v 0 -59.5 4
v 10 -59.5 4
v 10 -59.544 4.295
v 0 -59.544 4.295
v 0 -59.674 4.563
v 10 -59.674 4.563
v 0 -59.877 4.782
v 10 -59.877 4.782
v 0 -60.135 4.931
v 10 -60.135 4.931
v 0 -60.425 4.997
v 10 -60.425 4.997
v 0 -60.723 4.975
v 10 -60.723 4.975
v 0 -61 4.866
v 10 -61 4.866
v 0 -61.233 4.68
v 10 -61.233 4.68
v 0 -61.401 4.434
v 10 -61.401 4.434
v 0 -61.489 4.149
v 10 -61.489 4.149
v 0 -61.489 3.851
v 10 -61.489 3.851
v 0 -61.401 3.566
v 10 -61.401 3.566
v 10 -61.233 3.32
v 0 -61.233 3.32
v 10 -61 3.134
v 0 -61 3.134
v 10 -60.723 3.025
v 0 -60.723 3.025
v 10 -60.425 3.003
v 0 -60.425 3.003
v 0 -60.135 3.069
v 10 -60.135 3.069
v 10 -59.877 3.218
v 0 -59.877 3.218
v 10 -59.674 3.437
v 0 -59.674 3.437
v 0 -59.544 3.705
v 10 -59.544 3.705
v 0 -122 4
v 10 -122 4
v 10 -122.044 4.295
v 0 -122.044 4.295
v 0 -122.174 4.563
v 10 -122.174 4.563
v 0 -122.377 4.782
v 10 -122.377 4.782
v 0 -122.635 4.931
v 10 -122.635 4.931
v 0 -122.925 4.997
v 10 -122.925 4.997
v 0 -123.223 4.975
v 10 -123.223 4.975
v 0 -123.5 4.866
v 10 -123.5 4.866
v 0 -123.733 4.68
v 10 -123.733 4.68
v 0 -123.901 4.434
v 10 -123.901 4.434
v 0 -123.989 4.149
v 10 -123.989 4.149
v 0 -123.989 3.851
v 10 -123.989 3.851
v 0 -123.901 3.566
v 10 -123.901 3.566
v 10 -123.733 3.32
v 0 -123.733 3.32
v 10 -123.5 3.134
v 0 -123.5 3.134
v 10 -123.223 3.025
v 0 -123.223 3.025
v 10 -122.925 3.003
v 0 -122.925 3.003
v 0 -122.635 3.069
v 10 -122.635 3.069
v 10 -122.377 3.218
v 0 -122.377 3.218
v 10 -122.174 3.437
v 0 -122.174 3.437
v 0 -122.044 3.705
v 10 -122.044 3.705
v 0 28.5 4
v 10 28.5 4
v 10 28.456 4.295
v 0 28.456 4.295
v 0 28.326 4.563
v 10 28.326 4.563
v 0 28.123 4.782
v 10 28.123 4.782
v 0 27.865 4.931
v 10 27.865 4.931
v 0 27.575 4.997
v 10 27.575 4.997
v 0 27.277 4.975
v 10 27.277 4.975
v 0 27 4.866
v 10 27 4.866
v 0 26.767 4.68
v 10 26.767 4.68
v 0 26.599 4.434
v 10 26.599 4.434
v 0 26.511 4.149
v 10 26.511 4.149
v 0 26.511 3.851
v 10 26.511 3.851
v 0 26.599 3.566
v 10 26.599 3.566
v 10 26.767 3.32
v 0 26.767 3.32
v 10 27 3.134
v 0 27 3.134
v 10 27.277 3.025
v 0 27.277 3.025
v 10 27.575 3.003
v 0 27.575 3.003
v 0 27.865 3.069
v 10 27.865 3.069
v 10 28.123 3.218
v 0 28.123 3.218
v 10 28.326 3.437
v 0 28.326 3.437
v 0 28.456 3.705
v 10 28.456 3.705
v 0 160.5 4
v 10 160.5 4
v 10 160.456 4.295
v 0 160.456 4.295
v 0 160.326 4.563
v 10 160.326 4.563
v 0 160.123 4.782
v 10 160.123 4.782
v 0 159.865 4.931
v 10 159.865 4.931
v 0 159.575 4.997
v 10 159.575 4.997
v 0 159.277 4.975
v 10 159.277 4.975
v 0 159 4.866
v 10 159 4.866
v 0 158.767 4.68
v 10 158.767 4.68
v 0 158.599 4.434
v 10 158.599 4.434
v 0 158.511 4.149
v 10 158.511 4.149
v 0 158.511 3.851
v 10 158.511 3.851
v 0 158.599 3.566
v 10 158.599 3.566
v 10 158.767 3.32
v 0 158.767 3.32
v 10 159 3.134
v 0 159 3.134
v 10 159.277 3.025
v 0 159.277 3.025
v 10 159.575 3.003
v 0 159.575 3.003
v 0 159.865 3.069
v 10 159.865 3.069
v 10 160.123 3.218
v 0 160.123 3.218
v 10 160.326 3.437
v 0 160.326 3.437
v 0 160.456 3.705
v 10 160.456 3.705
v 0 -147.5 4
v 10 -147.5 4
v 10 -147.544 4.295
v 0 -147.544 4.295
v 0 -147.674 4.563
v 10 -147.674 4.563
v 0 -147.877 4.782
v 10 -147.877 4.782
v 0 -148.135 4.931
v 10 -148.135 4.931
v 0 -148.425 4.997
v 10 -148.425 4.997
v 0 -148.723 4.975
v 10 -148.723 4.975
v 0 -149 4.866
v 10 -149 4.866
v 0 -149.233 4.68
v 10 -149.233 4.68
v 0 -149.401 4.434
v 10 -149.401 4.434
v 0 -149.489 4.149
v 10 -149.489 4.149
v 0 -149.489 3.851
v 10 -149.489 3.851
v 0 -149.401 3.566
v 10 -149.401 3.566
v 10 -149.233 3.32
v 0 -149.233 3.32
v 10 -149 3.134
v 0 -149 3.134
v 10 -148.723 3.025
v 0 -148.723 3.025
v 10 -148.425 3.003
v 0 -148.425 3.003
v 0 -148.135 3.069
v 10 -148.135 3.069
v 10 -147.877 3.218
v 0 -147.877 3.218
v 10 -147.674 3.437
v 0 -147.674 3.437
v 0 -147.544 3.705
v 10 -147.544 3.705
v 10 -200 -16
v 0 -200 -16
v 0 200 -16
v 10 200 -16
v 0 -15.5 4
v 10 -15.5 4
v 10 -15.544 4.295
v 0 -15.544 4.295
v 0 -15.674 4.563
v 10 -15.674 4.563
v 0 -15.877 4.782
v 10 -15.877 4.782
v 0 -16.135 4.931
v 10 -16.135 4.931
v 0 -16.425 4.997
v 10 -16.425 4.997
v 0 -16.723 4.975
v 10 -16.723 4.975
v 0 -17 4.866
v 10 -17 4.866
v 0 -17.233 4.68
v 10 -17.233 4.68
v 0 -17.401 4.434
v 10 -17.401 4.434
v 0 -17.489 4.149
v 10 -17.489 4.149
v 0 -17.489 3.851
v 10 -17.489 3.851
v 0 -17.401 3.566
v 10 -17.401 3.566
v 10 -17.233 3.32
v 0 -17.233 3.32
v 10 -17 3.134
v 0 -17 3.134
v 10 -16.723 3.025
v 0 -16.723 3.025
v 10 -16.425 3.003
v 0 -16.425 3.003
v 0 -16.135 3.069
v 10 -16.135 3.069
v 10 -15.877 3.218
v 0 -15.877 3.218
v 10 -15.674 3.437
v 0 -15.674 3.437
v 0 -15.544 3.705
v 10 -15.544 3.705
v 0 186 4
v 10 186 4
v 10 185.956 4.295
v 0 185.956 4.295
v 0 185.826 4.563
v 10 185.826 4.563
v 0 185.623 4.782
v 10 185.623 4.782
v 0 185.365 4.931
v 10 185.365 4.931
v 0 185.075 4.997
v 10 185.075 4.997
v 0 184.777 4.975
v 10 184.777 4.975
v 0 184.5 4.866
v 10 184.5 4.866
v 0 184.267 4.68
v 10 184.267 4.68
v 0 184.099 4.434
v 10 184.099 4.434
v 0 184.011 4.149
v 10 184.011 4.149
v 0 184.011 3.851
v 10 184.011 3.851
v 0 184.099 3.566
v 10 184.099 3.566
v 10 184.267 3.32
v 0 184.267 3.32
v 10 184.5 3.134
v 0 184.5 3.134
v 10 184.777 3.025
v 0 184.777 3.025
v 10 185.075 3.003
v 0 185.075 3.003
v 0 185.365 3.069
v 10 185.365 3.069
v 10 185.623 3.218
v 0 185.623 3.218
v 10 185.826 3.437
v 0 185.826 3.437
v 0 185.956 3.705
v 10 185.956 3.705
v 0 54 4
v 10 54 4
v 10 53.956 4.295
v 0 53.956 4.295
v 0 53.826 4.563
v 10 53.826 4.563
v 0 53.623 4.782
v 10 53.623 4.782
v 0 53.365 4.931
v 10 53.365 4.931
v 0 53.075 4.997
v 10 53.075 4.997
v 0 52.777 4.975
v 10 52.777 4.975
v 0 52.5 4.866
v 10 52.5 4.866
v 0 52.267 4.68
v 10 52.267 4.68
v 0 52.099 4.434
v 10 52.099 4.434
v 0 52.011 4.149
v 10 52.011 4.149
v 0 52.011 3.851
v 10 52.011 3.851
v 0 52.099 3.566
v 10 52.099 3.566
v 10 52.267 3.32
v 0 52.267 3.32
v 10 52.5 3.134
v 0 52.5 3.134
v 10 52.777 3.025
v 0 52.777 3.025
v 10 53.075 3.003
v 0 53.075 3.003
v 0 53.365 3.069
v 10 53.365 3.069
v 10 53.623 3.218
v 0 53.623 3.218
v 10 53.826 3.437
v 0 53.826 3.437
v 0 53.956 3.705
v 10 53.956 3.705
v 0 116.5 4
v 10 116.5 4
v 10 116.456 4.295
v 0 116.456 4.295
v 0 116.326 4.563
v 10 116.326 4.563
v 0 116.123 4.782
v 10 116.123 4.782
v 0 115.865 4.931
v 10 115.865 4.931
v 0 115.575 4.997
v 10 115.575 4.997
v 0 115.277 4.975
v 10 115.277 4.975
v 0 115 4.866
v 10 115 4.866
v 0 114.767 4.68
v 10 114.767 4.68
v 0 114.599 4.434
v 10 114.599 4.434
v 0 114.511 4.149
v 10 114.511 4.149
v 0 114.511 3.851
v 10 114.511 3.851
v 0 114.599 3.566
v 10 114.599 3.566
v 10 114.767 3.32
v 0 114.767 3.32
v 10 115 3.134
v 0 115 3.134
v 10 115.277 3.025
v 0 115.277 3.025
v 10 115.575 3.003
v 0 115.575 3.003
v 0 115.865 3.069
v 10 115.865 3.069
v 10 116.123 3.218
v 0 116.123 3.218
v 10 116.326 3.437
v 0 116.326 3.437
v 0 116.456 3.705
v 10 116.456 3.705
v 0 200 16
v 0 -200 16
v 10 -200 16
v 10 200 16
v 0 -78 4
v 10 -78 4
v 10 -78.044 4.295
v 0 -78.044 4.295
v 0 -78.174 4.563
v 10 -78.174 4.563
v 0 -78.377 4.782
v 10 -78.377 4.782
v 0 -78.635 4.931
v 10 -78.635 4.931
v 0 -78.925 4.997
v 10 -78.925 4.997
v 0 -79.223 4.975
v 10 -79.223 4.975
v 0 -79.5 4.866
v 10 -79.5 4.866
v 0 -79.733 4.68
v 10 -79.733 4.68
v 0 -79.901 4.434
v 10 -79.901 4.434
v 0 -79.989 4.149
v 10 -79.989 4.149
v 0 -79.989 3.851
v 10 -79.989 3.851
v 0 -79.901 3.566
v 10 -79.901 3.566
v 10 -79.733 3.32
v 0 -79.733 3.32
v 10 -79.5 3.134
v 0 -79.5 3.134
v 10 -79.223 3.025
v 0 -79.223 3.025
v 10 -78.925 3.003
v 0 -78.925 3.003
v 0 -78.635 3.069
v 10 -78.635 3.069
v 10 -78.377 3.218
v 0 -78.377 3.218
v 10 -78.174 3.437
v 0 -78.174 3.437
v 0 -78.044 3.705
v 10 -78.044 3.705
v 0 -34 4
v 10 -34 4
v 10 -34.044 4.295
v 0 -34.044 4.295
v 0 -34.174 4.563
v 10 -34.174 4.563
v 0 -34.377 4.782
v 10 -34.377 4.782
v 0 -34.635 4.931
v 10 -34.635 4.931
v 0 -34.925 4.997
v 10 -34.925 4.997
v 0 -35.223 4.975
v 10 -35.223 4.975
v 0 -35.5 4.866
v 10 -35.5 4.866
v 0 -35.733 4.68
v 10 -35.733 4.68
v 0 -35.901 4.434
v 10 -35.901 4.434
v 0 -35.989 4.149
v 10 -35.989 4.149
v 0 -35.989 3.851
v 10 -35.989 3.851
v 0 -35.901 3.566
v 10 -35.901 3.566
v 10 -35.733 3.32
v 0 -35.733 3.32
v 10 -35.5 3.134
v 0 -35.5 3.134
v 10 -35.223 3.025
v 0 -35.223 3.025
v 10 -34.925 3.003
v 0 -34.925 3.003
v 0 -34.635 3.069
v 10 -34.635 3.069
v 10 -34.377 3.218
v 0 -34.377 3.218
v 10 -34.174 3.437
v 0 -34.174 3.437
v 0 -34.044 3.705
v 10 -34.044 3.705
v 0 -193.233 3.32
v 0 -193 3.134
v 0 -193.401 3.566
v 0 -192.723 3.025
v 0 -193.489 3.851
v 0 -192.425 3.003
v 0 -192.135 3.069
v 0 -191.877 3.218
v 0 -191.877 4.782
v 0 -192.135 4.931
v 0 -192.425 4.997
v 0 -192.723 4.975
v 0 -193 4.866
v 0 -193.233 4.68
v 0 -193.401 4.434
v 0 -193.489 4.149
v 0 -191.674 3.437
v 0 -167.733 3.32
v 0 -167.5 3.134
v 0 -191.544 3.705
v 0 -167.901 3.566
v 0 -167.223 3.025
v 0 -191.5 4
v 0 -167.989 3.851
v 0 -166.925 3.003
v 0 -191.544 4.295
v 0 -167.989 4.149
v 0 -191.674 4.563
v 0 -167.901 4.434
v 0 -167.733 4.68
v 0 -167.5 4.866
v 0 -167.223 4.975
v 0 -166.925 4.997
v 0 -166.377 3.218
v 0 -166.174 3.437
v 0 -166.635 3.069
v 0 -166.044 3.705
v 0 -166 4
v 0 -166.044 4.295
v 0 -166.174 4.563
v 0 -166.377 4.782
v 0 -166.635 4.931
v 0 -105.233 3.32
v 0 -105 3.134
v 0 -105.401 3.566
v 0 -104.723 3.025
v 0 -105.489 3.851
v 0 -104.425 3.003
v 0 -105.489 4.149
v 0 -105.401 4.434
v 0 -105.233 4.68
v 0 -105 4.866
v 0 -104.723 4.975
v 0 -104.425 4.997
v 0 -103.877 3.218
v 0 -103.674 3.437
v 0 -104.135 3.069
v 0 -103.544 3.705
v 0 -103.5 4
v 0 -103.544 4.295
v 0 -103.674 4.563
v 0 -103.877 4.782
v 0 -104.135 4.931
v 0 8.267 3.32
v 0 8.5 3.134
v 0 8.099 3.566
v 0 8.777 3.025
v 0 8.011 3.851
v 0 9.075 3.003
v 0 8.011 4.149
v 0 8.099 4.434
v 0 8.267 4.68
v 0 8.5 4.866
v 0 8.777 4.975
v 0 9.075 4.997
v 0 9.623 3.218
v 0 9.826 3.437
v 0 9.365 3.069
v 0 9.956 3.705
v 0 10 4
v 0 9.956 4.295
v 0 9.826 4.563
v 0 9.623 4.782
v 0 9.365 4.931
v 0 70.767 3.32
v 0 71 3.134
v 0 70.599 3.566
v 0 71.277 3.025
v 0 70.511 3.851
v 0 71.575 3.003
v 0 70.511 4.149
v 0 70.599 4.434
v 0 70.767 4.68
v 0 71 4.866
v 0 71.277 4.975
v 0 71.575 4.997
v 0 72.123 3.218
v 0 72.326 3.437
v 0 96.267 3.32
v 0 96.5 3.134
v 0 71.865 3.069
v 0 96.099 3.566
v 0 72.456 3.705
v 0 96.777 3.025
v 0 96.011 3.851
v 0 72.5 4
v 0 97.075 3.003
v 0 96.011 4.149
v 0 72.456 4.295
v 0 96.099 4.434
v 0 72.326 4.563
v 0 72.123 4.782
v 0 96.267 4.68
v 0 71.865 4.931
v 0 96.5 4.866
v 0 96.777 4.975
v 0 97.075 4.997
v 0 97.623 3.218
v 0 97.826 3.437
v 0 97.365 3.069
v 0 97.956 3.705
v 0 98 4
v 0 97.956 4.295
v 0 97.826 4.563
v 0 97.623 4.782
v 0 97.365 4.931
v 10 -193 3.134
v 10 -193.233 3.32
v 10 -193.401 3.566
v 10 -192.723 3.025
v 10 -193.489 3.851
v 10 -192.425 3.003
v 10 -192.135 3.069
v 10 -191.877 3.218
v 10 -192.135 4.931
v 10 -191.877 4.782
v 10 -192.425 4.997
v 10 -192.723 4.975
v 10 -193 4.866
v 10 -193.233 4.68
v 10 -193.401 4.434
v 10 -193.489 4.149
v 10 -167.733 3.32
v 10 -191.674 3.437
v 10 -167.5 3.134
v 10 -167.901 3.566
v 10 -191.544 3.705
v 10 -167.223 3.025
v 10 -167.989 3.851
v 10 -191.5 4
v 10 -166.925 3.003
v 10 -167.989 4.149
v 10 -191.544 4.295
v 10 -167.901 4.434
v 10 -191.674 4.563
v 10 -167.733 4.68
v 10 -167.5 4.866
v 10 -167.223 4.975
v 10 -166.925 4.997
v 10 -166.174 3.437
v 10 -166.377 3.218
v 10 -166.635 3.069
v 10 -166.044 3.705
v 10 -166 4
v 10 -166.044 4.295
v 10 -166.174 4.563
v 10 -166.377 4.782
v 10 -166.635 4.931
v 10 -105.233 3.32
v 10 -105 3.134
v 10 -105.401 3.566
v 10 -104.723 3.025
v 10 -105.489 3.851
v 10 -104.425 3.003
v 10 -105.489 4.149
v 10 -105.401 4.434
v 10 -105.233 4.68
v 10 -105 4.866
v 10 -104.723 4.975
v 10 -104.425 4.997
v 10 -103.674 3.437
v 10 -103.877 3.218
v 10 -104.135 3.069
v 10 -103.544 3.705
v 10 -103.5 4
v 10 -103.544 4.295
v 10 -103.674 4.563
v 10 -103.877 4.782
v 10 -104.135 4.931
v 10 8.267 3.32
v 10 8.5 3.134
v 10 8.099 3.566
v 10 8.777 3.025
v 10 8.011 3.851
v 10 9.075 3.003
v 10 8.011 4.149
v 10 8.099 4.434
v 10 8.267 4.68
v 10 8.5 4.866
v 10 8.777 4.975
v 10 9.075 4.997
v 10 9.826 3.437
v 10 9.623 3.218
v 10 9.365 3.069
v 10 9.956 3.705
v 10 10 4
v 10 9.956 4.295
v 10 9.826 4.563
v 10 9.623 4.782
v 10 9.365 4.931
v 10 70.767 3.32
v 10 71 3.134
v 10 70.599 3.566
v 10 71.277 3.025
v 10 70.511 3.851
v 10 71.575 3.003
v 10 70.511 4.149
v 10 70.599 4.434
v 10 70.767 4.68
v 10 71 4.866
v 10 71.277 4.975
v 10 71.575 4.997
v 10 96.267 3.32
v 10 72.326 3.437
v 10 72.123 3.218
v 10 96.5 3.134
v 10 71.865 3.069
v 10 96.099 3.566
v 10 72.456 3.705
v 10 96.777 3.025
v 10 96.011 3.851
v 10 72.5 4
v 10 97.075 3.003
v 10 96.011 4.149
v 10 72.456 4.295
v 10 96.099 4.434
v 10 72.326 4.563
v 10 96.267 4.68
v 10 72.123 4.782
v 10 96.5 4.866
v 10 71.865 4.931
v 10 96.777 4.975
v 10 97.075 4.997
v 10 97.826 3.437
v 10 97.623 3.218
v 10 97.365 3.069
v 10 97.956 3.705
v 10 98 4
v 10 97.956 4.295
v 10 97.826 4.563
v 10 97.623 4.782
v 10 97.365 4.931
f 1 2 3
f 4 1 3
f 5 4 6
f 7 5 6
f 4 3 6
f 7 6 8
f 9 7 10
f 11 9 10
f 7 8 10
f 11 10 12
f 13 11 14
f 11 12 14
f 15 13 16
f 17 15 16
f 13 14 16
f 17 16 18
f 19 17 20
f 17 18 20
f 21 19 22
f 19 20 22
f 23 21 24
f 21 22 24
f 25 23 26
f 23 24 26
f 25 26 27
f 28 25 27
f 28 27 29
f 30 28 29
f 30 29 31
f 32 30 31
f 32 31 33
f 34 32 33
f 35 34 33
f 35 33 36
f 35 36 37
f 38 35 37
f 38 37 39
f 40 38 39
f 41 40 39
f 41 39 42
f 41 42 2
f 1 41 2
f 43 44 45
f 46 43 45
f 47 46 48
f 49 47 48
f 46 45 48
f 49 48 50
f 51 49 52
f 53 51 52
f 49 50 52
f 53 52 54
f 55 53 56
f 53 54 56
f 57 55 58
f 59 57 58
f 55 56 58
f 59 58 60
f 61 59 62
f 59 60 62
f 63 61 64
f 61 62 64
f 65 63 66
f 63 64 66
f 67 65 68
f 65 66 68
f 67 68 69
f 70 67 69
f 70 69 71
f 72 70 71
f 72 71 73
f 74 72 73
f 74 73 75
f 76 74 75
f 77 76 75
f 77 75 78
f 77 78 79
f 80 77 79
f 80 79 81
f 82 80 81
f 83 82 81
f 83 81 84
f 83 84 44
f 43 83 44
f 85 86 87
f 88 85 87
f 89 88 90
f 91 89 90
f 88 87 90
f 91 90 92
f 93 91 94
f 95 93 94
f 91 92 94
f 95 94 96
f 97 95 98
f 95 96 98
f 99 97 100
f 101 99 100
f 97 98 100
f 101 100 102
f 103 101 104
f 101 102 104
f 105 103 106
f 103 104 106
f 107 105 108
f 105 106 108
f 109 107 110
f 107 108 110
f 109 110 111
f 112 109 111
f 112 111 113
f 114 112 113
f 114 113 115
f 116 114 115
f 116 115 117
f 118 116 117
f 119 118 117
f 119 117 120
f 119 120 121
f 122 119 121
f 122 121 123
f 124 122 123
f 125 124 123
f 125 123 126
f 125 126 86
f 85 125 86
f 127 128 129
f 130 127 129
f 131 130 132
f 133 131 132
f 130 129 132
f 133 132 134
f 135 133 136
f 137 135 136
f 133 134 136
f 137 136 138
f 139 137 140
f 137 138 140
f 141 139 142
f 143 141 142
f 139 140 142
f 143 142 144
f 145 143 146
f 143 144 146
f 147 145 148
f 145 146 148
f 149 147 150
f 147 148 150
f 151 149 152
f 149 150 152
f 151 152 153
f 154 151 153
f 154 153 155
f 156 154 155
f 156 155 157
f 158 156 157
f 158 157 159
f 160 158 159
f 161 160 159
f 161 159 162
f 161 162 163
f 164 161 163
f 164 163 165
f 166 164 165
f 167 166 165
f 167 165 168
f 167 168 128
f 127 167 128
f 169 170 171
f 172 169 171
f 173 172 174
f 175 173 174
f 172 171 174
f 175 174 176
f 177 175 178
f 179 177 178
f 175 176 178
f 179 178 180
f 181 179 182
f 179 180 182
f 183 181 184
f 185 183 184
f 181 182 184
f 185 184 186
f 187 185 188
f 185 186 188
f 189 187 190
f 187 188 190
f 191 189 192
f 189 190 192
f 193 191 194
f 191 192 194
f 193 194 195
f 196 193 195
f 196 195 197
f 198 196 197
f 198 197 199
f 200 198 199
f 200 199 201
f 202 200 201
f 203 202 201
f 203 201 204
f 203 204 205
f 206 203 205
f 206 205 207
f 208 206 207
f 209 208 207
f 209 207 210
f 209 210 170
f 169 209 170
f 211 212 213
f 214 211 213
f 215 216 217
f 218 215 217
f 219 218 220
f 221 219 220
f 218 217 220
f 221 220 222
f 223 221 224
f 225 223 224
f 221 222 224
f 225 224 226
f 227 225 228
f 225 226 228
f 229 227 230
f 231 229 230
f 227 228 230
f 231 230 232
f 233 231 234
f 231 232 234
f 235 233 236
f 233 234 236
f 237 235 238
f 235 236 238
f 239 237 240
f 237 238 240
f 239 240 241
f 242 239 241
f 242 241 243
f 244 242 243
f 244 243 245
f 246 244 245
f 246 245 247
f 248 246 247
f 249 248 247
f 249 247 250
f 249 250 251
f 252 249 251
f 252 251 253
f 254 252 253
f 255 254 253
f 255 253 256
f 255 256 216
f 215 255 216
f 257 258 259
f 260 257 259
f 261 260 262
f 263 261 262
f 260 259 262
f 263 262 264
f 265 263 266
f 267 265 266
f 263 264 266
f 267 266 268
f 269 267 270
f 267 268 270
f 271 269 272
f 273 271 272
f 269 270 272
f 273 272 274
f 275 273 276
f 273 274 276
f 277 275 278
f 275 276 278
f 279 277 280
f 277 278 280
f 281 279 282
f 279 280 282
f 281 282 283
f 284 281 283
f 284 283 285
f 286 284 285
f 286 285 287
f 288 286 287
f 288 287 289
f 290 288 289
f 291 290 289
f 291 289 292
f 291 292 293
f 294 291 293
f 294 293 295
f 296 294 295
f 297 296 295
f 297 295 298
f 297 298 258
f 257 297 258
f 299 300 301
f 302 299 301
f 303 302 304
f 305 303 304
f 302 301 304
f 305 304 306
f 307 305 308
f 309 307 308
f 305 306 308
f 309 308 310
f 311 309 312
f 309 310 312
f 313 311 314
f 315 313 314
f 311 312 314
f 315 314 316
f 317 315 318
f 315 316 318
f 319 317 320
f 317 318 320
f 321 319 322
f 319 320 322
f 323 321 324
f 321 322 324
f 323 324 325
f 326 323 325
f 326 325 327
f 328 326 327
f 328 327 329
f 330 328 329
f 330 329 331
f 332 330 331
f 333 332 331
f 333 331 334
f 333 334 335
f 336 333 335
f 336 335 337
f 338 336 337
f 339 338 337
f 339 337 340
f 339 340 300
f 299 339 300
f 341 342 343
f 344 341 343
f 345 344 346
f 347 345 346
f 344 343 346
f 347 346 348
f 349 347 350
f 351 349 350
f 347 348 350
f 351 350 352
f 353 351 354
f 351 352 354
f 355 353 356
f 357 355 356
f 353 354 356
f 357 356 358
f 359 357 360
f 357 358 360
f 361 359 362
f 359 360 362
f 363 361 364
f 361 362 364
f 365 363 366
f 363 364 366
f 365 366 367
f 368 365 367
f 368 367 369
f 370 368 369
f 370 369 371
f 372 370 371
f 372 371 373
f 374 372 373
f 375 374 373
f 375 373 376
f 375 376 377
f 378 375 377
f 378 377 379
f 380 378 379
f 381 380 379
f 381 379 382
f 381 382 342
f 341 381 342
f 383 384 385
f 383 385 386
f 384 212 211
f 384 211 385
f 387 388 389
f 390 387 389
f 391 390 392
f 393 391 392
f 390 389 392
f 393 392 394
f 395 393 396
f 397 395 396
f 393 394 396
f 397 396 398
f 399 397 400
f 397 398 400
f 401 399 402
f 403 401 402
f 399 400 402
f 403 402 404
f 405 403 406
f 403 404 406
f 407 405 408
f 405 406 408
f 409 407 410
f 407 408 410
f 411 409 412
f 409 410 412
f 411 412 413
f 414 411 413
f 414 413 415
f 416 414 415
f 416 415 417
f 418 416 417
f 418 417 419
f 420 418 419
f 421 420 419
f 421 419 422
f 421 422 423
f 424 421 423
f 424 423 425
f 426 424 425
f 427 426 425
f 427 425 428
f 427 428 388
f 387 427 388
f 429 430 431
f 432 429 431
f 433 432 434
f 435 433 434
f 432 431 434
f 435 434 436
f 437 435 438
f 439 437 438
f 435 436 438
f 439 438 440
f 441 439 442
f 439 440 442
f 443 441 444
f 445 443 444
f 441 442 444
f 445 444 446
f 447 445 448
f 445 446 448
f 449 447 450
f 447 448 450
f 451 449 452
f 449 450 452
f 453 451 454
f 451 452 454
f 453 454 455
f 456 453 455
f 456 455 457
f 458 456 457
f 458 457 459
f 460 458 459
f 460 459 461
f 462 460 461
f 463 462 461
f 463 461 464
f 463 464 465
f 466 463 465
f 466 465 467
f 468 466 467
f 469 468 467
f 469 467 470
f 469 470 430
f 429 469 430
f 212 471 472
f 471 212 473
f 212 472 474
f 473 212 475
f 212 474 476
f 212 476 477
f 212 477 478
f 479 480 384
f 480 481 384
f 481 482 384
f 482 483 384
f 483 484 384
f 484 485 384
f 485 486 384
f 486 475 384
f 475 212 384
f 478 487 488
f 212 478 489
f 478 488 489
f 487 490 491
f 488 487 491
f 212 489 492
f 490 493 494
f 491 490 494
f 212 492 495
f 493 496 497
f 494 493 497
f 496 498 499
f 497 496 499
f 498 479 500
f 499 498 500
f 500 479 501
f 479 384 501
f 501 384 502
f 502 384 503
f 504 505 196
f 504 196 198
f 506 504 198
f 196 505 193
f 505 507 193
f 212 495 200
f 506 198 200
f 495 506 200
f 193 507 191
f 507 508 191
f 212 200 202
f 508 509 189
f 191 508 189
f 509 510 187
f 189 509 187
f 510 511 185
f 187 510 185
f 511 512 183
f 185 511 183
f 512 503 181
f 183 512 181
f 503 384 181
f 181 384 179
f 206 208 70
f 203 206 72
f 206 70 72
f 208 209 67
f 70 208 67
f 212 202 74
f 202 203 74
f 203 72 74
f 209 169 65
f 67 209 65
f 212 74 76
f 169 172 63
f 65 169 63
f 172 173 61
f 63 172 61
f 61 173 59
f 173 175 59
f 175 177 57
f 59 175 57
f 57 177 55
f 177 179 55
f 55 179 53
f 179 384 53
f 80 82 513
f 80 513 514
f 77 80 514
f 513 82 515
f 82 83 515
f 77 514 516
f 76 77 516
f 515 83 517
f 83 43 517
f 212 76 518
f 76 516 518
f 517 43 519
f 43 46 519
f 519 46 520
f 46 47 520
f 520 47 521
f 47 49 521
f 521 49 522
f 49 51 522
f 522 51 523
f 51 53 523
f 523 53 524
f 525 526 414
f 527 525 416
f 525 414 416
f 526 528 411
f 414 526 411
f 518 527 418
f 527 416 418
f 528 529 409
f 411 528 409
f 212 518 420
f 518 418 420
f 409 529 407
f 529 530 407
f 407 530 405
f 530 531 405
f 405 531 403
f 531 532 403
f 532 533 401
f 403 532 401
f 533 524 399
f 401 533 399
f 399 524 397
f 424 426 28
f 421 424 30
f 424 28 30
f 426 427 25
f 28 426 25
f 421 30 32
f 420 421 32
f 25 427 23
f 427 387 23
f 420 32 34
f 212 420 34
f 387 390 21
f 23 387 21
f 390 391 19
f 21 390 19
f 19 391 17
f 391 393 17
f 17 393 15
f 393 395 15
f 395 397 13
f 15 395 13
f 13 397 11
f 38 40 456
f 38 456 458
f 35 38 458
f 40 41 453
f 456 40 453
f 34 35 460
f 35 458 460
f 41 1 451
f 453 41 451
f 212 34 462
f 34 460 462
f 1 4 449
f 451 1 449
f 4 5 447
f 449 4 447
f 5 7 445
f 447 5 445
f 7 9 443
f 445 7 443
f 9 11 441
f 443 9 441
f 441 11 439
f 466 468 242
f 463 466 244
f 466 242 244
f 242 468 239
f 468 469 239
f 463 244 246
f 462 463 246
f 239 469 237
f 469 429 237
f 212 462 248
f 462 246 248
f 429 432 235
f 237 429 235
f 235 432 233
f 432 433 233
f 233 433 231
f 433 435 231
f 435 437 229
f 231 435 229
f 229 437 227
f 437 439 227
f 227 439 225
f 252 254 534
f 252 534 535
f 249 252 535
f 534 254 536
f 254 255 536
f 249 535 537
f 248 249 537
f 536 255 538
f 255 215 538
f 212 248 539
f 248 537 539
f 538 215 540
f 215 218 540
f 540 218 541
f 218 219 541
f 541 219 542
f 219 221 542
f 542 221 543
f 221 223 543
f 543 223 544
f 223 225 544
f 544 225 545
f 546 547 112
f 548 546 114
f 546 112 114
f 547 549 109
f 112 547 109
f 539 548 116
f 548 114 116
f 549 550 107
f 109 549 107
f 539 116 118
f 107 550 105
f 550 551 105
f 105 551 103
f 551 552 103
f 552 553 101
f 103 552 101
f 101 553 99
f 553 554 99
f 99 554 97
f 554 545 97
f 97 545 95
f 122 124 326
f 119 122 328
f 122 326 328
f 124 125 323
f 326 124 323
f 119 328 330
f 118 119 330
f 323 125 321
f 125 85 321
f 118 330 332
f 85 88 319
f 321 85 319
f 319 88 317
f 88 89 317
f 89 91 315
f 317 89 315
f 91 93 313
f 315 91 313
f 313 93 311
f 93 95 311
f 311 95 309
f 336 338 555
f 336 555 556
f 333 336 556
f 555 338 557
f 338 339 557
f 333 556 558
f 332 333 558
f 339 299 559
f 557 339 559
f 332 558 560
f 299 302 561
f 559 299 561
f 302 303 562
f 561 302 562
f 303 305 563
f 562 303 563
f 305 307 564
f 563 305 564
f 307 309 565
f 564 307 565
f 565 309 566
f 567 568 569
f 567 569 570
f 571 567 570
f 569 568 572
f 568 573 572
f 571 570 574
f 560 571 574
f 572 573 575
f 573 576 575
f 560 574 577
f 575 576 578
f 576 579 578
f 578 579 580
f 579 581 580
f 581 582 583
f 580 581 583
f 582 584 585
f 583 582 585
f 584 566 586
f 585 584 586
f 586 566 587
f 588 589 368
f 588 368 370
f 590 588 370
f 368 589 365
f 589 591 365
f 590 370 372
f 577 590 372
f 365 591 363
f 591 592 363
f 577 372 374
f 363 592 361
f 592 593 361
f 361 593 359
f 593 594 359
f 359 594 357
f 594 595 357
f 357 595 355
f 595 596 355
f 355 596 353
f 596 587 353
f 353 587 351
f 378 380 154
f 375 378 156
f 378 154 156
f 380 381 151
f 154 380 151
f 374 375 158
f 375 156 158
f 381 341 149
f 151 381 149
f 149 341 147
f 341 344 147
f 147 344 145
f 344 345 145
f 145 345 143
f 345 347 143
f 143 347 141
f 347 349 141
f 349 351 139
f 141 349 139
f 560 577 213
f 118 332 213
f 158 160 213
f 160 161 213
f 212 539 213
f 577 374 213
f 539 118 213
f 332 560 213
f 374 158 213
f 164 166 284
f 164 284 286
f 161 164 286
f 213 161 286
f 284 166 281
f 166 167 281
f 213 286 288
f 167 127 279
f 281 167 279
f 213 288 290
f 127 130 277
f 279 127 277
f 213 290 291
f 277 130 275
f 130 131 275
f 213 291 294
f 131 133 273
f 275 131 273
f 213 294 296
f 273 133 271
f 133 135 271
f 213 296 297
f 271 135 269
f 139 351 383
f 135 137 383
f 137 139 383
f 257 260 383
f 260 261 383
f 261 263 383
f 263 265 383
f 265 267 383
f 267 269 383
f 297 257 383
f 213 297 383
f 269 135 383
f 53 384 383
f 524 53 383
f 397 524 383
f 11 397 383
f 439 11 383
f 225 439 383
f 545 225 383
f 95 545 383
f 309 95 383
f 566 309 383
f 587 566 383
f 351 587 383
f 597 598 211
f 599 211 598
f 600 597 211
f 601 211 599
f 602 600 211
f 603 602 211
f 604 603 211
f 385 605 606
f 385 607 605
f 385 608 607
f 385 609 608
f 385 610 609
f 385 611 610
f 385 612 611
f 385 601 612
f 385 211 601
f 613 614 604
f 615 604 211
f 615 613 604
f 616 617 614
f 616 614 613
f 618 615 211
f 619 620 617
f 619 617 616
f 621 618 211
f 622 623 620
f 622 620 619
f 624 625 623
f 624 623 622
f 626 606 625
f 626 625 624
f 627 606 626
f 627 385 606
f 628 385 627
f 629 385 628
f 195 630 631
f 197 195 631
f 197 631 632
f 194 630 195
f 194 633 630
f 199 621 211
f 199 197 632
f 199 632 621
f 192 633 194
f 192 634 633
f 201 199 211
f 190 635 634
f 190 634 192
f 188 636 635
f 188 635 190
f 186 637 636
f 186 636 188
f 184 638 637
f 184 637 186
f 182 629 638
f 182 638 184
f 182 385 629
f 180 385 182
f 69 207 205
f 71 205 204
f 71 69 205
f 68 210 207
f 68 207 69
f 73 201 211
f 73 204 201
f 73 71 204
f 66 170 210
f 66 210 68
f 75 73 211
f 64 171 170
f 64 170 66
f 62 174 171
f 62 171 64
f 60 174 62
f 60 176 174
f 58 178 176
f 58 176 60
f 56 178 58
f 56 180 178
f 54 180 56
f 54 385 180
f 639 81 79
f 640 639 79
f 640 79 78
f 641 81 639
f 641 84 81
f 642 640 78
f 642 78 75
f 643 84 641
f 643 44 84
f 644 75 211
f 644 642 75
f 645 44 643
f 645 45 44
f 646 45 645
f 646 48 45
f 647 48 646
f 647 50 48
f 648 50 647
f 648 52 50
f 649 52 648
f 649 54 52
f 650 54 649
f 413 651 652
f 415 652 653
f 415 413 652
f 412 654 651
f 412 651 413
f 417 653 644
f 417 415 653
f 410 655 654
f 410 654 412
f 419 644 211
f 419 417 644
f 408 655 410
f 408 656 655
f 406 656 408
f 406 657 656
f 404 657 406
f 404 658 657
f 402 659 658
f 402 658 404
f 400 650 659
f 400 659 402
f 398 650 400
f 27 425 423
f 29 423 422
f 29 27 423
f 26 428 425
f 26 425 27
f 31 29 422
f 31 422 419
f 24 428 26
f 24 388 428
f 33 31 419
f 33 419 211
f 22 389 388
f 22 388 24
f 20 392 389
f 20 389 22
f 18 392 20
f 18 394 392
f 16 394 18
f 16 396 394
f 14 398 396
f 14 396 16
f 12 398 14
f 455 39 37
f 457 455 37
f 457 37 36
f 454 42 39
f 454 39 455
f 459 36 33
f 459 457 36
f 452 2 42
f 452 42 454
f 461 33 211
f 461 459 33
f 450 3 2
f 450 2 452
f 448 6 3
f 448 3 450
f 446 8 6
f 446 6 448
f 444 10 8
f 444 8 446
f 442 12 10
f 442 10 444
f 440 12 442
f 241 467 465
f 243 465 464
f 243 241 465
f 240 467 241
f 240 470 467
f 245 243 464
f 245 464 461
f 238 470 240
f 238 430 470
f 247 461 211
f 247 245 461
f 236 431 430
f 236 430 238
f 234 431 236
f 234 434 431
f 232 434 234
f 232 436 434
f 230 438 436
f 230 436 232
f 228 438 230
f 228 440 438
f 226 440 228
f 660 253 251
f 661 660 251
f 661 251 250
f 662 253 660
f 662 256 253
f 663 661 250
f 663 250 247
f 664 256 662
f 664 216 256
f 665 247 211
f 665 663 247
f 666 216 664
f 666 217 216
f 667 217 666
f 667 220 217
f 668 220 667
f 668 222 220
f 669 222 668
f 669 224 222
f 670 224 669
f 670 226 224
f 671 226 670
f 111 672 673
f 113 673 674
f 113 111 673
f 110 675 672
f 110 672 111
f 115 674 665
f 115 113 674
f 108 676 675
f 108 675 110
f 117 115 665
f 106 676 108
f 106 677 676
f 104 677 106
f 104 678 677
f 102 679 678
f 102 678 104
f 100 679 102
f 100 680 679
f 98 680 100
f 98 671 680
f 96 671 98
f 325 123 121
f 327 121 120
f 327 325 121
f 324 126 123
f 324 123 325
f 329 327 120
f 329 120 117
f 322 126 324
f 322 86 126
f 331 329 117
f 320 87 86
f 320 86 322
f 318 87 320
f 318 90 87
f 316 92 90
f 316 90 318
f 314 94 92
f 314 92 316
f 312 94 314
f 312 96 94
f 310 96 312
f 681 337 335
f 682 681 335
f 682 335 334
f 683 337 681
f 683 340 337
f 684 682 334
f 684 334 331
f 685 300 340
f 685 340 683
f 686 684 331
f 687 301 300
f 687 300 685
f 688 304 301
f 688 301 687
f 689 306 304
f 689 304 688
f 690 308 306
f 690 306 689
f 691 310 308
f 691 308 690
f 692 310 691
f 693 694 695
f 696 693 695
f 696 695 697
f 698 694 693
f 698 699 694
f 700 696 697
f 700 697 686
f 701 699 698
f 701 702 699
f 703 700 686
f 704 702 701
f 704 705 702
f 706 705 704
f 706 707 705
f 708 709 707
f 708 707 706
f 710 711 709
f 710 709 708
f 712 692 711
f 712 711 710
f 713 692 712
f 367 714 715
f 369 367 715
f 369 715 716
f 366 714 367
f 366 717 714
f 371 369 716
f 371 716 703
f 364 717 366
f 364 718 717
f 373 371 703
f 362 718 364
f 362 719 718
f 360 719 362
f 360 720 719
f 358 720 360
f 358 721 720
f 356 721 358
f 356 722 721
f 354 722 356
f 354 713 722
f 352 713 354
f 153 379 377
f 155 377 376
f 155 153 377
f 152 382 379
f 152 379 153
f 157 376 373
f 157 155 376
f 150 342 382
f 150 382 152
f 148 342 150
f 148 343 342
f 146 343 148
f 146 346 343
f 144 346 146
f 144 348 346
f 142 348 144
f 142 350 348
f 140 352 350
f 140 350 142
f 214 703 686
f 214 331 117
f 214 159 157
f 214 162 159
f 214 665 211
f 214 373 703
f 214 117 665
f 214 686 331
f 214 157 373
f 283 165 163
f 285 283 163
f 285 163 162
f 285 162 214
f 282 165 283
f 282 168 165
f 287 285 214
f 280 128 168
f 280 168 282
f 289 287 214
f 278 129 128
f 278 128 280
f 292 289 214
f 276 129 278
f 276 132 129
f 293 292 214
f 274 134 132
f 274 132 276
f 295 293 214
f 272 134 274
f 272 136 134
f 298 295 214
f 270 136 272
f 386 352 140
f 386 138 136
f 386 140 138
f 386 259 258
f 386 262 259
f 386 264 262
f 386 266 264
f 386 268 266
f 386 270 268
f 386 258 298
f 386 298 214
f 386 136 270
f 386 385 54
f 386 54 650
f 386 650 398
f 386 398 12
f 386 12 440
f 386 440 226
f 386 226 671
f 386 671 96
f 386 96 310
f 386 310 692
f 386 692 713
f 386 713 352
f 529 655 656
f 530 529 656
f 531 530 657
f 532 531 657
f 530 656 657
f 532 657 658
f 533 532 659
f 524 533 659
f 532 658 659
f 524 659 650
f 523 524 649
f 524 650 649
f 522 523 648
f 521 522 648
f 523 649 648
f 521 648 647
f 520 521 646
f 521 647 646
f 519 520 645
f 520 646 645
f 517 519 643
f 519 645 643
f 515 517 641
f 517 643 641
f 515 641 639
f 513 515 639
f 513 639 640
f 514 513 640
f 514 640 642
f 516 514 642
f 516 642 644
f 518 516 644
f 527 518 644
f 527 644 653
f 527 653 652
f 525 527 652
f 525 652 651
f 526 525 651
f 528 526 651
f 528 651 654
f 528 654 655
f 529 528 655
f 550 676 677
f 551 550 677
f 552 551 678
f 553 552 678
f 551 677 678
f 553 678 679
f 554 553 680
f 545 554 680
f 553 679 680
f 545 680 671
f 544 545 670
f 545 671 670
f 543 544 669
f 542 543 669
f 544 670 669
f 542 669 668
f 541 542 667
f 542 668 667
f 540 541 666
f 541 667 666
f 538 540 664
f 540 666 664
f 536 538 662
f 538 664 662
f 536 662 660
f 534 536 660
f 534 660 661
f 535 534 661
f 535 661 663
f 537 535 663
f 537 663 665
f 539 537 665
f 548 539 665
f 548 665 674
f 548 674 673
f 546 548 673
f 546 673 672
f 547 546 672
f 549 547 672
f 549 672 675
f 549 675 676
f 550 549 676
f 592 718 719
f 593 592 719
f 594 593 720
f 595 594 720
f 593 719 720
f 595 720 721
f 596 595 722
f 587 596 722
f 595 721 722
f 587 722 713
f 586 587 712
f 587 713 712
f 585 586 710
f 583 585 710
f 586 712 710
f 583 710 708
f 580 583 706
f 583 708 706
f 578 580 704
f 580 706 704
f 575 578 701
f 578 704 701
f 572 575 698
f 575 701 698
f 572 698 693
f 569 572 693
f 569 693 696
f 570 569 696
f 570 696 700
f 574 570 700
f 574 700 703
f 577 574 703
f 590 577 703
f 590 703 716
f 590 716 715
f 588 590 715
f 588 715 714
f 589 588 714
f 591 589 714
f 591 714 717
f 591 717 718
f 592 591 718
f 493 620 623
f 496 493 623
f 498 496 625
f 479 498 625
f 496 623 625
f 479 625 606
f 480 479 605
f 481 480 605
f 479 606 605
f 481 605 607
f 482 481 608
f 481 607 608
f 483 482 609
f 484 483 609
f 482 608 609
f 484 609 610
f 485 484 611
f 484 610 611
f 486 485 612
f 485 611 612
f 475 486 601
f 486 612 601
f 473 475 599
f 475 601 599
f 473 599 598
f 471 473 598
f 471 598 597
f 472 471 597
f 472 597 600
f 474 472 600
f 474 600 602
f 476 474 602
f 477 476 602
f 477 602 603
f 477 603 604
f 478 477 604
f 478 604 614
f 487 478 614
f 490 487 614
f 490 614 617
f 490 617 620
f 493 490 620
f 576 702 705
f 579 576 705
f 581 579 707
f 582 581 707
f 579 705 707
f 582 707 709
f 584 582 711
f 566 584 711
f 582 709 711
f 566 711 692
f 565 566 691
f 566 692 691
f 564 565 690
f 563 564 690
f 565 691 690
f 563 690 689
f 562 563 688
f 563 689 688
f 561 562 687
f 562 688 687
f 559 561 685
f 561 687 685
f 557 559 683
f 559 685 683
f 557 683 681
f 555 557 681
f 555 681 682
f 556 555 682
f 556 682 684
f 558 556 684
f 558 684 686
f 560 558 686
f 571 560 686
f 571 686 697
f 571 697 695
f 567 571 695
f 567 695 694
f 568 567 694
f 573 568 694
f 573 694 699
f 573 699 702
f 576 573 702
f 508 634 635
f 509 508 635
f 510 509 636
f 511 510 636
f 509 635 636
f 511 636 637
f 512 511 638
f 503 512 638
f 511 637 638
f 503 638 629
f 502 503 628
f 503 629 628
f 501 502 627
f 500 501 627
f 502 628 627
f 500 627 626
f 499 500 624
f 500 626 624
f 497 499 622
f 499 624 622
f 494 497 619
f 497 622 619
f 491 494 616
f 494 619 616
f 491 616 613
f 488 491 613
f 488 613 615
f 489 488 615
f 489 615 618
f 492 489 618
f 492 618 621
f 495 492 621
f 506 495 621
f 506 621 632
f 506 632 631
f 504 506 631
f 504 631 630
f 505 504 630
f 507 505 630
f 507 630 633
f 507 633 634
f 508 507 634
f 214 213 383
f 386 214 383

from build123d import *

# Parameters (mm, degrees)
F0_W     = 400
F0_H     = 32
F1_DEPTH = 10
F2_R     = 1
F3_DEPTH = 25


# Not quite as in the source:
# - a feature names something its author has since deleted; it is built from what else it names


with BuildPart() as f1:
    # F0 (on Right) → F1 (new body)
    with BuildSketch(Plane.YZ):
        Rectangle(F0_W, F0_H)
    extrude(amount=F1_DEPTH)

    # F2 (on face) → F3 (cut)
    with BuildSketch(Plane.YZ.offset(10)):
        with Locations((-192.5, 4)):
            Circle(F2_R)
        with Locations((-167, 4)):
            Circle(F2_R)
        with Locations((-148.5, 4)):
            Circle(F2_R)
        with Locations((-123, 4)):
            Circle(F2_R)
        with Locations((-104.5, 4)):
            Circle(F2_R)
        with Locations((-79, 4)):
            Circle(F2_R)
        with Locations((-60.5, 4)):
            Circle(F2_R)
        with Locations((-35, 4)):
            Circle(F2_R)
        with Locations((-16.5, 4)):
            Circle(F2_R)
        with Locations((9, 4)):
            Circle(F2_R)
        with Locations((27.5, 4)):
            Circle(F2_R)
        with Locations((53, 4)):
            Circle(F2_R)
        with Locations((71.5, 4)):
            Circle(F2_R)
        with Locations((97, 4)):
            Circle(F2_R)
        with Locations((115.5, 4)):
            Circle(F2_R)
        with Locations((159.5, 4)):
            Circle(F2_R)
        with Locations((185, 4)):
            Circle(F2_R)
    extrude(amount=-F3_DEPTH, mode=Mode.SUBTRACT)


solid = f1.part
